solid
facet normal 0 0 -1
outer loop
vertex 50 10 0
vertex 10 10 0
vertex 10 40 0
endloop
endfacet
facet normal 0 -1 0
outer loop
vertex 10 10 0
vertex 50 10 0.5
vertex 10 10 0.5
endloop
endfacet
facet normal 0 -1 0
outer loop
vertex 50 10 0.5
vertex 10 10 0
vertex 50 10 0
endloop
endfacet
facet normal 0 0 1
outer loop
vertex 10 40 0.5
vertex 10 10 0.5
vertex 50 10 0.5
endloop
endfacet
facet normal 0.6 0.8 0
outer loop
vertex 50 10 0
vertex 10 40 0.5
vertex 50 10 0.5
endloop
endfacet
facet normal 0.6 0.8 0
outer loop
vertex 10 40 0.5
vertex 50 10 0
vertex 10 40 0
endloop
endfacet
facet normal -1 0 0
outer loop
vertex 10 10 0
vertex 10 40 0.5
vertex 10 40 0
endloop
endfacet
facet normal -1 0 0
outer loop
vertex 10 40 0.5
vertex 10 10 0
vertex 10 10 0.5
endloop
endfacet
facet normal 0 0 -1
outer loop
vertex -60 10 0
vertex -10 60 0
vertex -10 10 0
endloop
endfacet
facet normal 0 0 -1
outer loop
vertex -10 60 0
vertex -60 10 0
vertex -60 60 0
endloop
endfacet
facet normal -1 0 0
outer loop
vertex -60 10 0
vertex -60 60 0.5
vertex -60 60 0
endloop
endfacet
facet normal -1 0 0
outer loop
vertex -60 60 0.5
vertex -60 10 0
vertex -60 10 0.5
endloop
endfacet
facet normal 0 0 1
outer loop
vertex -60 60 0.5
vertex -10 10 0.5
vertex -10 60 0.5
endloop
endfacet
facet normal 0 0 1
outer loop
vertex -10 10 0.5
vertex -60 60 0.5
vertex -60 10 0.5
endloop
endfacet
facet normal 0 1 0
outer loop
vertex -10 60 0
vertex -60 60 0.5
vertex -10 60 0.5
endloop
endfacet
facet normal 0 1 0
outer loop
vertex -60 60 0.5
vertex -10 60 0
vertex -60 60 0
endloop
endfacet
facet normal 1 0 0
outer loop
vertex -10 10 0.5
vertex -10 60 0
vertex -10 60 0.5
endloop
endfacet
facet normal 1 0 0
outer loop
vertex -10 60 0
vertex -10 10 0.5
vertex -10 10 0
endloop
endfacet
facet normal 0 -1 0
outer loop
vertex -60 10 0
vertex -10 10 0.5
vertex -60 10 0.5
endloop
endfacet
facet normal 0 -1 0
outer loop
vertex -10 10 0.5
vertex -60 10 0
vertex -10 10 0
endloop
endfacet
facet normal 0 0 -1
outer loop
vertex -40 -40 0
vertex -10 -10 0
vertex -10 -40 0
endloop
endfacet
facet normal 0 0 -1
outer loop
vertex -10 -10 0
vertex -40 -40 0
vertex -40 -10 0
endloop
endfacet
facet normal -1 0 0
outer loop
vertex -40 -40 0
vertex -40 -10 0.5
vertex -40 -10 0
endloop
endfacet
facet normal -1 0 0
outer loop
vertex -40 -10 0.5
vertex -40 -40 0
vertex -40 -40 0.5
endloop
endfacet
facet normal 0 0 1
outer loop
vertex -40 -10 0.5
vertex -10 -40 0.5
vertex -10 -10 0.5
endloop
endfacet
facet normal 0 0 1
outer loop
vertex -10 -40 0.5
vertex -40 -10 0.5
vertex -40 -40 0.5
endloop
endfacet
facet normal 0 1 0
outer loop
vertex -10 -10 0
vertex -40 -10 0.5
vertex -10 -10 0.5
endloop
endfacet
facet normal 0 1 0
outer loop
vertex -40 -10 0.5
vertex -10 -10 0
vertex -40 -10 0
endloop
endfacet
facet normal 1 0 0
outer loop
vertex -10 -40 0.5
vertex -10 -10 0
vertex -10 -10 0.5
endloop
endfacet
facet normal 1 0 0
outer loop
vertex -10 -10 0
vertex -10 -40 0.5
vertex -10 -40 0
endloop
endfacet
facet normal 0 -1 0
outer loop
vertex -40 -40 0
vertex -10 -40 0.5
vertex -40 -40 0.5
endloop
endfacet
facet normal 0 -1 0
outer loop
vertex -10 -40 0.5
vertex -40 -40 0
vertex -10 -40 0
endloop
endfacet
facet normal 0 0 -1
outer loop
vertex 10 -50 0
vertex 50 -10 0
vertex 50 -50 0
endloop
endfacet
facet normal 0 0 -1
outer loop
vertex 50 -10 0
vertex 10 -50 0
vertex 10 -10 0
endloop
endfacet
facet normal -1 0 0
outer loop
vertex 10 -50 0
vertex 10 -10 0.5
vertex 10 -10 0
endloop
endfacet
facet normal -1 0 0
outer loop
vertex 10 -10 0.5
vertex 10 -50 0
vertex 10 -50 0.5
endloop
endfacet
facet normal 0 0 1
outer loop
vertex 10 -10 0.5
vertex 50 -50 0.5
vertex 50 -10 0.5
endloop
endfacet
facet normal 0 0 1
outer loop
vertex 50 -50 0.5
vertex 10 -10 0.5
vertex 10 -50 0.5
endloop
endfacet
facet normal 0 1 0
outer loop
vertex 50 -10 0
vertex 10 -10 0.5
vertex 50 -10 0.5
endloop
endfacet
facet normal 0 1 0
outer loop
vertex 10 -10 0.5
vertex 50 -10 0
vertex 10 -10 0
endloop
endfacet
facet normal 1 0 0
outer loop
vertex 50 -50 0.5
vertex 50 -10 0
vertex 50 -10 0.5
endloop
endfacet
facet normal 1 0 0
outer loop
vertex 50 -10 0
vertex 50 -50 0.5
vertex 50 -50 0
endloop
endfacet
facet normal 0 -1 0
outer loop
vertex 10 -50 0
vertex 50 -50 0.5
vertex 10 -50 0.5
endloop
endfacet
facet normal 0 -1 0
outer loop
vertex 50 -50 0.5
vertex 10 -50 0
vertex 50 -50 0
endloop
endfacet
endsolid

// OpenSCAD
/* Geometrischer Beweis des Satz des Pythagoras

Gelbes Dreieck 8 mal drucken 
Grünes c-Quadrat 1 mal drucken
Rotes a-Quadrat 1 mal drucken
Blaues b-Quadrat 1 mal drucken
*/

// Größe des Dreiecks
a=30;
b=40;
c=50;
// Dicke der Platten
d=0.5;

color("yellow") translate([10,10]) linear_extrude(d) polygon([[0,0],[b,0],[0,a]]);

color("green") translate([-10-c,10]) linear_extrude(d) square(c);

color("red") translate([-10-a,-10-a]) linear_extrude(d) square(a);

color("blue") translate([10,-10-b]) linear_extrude(d) square(b);
